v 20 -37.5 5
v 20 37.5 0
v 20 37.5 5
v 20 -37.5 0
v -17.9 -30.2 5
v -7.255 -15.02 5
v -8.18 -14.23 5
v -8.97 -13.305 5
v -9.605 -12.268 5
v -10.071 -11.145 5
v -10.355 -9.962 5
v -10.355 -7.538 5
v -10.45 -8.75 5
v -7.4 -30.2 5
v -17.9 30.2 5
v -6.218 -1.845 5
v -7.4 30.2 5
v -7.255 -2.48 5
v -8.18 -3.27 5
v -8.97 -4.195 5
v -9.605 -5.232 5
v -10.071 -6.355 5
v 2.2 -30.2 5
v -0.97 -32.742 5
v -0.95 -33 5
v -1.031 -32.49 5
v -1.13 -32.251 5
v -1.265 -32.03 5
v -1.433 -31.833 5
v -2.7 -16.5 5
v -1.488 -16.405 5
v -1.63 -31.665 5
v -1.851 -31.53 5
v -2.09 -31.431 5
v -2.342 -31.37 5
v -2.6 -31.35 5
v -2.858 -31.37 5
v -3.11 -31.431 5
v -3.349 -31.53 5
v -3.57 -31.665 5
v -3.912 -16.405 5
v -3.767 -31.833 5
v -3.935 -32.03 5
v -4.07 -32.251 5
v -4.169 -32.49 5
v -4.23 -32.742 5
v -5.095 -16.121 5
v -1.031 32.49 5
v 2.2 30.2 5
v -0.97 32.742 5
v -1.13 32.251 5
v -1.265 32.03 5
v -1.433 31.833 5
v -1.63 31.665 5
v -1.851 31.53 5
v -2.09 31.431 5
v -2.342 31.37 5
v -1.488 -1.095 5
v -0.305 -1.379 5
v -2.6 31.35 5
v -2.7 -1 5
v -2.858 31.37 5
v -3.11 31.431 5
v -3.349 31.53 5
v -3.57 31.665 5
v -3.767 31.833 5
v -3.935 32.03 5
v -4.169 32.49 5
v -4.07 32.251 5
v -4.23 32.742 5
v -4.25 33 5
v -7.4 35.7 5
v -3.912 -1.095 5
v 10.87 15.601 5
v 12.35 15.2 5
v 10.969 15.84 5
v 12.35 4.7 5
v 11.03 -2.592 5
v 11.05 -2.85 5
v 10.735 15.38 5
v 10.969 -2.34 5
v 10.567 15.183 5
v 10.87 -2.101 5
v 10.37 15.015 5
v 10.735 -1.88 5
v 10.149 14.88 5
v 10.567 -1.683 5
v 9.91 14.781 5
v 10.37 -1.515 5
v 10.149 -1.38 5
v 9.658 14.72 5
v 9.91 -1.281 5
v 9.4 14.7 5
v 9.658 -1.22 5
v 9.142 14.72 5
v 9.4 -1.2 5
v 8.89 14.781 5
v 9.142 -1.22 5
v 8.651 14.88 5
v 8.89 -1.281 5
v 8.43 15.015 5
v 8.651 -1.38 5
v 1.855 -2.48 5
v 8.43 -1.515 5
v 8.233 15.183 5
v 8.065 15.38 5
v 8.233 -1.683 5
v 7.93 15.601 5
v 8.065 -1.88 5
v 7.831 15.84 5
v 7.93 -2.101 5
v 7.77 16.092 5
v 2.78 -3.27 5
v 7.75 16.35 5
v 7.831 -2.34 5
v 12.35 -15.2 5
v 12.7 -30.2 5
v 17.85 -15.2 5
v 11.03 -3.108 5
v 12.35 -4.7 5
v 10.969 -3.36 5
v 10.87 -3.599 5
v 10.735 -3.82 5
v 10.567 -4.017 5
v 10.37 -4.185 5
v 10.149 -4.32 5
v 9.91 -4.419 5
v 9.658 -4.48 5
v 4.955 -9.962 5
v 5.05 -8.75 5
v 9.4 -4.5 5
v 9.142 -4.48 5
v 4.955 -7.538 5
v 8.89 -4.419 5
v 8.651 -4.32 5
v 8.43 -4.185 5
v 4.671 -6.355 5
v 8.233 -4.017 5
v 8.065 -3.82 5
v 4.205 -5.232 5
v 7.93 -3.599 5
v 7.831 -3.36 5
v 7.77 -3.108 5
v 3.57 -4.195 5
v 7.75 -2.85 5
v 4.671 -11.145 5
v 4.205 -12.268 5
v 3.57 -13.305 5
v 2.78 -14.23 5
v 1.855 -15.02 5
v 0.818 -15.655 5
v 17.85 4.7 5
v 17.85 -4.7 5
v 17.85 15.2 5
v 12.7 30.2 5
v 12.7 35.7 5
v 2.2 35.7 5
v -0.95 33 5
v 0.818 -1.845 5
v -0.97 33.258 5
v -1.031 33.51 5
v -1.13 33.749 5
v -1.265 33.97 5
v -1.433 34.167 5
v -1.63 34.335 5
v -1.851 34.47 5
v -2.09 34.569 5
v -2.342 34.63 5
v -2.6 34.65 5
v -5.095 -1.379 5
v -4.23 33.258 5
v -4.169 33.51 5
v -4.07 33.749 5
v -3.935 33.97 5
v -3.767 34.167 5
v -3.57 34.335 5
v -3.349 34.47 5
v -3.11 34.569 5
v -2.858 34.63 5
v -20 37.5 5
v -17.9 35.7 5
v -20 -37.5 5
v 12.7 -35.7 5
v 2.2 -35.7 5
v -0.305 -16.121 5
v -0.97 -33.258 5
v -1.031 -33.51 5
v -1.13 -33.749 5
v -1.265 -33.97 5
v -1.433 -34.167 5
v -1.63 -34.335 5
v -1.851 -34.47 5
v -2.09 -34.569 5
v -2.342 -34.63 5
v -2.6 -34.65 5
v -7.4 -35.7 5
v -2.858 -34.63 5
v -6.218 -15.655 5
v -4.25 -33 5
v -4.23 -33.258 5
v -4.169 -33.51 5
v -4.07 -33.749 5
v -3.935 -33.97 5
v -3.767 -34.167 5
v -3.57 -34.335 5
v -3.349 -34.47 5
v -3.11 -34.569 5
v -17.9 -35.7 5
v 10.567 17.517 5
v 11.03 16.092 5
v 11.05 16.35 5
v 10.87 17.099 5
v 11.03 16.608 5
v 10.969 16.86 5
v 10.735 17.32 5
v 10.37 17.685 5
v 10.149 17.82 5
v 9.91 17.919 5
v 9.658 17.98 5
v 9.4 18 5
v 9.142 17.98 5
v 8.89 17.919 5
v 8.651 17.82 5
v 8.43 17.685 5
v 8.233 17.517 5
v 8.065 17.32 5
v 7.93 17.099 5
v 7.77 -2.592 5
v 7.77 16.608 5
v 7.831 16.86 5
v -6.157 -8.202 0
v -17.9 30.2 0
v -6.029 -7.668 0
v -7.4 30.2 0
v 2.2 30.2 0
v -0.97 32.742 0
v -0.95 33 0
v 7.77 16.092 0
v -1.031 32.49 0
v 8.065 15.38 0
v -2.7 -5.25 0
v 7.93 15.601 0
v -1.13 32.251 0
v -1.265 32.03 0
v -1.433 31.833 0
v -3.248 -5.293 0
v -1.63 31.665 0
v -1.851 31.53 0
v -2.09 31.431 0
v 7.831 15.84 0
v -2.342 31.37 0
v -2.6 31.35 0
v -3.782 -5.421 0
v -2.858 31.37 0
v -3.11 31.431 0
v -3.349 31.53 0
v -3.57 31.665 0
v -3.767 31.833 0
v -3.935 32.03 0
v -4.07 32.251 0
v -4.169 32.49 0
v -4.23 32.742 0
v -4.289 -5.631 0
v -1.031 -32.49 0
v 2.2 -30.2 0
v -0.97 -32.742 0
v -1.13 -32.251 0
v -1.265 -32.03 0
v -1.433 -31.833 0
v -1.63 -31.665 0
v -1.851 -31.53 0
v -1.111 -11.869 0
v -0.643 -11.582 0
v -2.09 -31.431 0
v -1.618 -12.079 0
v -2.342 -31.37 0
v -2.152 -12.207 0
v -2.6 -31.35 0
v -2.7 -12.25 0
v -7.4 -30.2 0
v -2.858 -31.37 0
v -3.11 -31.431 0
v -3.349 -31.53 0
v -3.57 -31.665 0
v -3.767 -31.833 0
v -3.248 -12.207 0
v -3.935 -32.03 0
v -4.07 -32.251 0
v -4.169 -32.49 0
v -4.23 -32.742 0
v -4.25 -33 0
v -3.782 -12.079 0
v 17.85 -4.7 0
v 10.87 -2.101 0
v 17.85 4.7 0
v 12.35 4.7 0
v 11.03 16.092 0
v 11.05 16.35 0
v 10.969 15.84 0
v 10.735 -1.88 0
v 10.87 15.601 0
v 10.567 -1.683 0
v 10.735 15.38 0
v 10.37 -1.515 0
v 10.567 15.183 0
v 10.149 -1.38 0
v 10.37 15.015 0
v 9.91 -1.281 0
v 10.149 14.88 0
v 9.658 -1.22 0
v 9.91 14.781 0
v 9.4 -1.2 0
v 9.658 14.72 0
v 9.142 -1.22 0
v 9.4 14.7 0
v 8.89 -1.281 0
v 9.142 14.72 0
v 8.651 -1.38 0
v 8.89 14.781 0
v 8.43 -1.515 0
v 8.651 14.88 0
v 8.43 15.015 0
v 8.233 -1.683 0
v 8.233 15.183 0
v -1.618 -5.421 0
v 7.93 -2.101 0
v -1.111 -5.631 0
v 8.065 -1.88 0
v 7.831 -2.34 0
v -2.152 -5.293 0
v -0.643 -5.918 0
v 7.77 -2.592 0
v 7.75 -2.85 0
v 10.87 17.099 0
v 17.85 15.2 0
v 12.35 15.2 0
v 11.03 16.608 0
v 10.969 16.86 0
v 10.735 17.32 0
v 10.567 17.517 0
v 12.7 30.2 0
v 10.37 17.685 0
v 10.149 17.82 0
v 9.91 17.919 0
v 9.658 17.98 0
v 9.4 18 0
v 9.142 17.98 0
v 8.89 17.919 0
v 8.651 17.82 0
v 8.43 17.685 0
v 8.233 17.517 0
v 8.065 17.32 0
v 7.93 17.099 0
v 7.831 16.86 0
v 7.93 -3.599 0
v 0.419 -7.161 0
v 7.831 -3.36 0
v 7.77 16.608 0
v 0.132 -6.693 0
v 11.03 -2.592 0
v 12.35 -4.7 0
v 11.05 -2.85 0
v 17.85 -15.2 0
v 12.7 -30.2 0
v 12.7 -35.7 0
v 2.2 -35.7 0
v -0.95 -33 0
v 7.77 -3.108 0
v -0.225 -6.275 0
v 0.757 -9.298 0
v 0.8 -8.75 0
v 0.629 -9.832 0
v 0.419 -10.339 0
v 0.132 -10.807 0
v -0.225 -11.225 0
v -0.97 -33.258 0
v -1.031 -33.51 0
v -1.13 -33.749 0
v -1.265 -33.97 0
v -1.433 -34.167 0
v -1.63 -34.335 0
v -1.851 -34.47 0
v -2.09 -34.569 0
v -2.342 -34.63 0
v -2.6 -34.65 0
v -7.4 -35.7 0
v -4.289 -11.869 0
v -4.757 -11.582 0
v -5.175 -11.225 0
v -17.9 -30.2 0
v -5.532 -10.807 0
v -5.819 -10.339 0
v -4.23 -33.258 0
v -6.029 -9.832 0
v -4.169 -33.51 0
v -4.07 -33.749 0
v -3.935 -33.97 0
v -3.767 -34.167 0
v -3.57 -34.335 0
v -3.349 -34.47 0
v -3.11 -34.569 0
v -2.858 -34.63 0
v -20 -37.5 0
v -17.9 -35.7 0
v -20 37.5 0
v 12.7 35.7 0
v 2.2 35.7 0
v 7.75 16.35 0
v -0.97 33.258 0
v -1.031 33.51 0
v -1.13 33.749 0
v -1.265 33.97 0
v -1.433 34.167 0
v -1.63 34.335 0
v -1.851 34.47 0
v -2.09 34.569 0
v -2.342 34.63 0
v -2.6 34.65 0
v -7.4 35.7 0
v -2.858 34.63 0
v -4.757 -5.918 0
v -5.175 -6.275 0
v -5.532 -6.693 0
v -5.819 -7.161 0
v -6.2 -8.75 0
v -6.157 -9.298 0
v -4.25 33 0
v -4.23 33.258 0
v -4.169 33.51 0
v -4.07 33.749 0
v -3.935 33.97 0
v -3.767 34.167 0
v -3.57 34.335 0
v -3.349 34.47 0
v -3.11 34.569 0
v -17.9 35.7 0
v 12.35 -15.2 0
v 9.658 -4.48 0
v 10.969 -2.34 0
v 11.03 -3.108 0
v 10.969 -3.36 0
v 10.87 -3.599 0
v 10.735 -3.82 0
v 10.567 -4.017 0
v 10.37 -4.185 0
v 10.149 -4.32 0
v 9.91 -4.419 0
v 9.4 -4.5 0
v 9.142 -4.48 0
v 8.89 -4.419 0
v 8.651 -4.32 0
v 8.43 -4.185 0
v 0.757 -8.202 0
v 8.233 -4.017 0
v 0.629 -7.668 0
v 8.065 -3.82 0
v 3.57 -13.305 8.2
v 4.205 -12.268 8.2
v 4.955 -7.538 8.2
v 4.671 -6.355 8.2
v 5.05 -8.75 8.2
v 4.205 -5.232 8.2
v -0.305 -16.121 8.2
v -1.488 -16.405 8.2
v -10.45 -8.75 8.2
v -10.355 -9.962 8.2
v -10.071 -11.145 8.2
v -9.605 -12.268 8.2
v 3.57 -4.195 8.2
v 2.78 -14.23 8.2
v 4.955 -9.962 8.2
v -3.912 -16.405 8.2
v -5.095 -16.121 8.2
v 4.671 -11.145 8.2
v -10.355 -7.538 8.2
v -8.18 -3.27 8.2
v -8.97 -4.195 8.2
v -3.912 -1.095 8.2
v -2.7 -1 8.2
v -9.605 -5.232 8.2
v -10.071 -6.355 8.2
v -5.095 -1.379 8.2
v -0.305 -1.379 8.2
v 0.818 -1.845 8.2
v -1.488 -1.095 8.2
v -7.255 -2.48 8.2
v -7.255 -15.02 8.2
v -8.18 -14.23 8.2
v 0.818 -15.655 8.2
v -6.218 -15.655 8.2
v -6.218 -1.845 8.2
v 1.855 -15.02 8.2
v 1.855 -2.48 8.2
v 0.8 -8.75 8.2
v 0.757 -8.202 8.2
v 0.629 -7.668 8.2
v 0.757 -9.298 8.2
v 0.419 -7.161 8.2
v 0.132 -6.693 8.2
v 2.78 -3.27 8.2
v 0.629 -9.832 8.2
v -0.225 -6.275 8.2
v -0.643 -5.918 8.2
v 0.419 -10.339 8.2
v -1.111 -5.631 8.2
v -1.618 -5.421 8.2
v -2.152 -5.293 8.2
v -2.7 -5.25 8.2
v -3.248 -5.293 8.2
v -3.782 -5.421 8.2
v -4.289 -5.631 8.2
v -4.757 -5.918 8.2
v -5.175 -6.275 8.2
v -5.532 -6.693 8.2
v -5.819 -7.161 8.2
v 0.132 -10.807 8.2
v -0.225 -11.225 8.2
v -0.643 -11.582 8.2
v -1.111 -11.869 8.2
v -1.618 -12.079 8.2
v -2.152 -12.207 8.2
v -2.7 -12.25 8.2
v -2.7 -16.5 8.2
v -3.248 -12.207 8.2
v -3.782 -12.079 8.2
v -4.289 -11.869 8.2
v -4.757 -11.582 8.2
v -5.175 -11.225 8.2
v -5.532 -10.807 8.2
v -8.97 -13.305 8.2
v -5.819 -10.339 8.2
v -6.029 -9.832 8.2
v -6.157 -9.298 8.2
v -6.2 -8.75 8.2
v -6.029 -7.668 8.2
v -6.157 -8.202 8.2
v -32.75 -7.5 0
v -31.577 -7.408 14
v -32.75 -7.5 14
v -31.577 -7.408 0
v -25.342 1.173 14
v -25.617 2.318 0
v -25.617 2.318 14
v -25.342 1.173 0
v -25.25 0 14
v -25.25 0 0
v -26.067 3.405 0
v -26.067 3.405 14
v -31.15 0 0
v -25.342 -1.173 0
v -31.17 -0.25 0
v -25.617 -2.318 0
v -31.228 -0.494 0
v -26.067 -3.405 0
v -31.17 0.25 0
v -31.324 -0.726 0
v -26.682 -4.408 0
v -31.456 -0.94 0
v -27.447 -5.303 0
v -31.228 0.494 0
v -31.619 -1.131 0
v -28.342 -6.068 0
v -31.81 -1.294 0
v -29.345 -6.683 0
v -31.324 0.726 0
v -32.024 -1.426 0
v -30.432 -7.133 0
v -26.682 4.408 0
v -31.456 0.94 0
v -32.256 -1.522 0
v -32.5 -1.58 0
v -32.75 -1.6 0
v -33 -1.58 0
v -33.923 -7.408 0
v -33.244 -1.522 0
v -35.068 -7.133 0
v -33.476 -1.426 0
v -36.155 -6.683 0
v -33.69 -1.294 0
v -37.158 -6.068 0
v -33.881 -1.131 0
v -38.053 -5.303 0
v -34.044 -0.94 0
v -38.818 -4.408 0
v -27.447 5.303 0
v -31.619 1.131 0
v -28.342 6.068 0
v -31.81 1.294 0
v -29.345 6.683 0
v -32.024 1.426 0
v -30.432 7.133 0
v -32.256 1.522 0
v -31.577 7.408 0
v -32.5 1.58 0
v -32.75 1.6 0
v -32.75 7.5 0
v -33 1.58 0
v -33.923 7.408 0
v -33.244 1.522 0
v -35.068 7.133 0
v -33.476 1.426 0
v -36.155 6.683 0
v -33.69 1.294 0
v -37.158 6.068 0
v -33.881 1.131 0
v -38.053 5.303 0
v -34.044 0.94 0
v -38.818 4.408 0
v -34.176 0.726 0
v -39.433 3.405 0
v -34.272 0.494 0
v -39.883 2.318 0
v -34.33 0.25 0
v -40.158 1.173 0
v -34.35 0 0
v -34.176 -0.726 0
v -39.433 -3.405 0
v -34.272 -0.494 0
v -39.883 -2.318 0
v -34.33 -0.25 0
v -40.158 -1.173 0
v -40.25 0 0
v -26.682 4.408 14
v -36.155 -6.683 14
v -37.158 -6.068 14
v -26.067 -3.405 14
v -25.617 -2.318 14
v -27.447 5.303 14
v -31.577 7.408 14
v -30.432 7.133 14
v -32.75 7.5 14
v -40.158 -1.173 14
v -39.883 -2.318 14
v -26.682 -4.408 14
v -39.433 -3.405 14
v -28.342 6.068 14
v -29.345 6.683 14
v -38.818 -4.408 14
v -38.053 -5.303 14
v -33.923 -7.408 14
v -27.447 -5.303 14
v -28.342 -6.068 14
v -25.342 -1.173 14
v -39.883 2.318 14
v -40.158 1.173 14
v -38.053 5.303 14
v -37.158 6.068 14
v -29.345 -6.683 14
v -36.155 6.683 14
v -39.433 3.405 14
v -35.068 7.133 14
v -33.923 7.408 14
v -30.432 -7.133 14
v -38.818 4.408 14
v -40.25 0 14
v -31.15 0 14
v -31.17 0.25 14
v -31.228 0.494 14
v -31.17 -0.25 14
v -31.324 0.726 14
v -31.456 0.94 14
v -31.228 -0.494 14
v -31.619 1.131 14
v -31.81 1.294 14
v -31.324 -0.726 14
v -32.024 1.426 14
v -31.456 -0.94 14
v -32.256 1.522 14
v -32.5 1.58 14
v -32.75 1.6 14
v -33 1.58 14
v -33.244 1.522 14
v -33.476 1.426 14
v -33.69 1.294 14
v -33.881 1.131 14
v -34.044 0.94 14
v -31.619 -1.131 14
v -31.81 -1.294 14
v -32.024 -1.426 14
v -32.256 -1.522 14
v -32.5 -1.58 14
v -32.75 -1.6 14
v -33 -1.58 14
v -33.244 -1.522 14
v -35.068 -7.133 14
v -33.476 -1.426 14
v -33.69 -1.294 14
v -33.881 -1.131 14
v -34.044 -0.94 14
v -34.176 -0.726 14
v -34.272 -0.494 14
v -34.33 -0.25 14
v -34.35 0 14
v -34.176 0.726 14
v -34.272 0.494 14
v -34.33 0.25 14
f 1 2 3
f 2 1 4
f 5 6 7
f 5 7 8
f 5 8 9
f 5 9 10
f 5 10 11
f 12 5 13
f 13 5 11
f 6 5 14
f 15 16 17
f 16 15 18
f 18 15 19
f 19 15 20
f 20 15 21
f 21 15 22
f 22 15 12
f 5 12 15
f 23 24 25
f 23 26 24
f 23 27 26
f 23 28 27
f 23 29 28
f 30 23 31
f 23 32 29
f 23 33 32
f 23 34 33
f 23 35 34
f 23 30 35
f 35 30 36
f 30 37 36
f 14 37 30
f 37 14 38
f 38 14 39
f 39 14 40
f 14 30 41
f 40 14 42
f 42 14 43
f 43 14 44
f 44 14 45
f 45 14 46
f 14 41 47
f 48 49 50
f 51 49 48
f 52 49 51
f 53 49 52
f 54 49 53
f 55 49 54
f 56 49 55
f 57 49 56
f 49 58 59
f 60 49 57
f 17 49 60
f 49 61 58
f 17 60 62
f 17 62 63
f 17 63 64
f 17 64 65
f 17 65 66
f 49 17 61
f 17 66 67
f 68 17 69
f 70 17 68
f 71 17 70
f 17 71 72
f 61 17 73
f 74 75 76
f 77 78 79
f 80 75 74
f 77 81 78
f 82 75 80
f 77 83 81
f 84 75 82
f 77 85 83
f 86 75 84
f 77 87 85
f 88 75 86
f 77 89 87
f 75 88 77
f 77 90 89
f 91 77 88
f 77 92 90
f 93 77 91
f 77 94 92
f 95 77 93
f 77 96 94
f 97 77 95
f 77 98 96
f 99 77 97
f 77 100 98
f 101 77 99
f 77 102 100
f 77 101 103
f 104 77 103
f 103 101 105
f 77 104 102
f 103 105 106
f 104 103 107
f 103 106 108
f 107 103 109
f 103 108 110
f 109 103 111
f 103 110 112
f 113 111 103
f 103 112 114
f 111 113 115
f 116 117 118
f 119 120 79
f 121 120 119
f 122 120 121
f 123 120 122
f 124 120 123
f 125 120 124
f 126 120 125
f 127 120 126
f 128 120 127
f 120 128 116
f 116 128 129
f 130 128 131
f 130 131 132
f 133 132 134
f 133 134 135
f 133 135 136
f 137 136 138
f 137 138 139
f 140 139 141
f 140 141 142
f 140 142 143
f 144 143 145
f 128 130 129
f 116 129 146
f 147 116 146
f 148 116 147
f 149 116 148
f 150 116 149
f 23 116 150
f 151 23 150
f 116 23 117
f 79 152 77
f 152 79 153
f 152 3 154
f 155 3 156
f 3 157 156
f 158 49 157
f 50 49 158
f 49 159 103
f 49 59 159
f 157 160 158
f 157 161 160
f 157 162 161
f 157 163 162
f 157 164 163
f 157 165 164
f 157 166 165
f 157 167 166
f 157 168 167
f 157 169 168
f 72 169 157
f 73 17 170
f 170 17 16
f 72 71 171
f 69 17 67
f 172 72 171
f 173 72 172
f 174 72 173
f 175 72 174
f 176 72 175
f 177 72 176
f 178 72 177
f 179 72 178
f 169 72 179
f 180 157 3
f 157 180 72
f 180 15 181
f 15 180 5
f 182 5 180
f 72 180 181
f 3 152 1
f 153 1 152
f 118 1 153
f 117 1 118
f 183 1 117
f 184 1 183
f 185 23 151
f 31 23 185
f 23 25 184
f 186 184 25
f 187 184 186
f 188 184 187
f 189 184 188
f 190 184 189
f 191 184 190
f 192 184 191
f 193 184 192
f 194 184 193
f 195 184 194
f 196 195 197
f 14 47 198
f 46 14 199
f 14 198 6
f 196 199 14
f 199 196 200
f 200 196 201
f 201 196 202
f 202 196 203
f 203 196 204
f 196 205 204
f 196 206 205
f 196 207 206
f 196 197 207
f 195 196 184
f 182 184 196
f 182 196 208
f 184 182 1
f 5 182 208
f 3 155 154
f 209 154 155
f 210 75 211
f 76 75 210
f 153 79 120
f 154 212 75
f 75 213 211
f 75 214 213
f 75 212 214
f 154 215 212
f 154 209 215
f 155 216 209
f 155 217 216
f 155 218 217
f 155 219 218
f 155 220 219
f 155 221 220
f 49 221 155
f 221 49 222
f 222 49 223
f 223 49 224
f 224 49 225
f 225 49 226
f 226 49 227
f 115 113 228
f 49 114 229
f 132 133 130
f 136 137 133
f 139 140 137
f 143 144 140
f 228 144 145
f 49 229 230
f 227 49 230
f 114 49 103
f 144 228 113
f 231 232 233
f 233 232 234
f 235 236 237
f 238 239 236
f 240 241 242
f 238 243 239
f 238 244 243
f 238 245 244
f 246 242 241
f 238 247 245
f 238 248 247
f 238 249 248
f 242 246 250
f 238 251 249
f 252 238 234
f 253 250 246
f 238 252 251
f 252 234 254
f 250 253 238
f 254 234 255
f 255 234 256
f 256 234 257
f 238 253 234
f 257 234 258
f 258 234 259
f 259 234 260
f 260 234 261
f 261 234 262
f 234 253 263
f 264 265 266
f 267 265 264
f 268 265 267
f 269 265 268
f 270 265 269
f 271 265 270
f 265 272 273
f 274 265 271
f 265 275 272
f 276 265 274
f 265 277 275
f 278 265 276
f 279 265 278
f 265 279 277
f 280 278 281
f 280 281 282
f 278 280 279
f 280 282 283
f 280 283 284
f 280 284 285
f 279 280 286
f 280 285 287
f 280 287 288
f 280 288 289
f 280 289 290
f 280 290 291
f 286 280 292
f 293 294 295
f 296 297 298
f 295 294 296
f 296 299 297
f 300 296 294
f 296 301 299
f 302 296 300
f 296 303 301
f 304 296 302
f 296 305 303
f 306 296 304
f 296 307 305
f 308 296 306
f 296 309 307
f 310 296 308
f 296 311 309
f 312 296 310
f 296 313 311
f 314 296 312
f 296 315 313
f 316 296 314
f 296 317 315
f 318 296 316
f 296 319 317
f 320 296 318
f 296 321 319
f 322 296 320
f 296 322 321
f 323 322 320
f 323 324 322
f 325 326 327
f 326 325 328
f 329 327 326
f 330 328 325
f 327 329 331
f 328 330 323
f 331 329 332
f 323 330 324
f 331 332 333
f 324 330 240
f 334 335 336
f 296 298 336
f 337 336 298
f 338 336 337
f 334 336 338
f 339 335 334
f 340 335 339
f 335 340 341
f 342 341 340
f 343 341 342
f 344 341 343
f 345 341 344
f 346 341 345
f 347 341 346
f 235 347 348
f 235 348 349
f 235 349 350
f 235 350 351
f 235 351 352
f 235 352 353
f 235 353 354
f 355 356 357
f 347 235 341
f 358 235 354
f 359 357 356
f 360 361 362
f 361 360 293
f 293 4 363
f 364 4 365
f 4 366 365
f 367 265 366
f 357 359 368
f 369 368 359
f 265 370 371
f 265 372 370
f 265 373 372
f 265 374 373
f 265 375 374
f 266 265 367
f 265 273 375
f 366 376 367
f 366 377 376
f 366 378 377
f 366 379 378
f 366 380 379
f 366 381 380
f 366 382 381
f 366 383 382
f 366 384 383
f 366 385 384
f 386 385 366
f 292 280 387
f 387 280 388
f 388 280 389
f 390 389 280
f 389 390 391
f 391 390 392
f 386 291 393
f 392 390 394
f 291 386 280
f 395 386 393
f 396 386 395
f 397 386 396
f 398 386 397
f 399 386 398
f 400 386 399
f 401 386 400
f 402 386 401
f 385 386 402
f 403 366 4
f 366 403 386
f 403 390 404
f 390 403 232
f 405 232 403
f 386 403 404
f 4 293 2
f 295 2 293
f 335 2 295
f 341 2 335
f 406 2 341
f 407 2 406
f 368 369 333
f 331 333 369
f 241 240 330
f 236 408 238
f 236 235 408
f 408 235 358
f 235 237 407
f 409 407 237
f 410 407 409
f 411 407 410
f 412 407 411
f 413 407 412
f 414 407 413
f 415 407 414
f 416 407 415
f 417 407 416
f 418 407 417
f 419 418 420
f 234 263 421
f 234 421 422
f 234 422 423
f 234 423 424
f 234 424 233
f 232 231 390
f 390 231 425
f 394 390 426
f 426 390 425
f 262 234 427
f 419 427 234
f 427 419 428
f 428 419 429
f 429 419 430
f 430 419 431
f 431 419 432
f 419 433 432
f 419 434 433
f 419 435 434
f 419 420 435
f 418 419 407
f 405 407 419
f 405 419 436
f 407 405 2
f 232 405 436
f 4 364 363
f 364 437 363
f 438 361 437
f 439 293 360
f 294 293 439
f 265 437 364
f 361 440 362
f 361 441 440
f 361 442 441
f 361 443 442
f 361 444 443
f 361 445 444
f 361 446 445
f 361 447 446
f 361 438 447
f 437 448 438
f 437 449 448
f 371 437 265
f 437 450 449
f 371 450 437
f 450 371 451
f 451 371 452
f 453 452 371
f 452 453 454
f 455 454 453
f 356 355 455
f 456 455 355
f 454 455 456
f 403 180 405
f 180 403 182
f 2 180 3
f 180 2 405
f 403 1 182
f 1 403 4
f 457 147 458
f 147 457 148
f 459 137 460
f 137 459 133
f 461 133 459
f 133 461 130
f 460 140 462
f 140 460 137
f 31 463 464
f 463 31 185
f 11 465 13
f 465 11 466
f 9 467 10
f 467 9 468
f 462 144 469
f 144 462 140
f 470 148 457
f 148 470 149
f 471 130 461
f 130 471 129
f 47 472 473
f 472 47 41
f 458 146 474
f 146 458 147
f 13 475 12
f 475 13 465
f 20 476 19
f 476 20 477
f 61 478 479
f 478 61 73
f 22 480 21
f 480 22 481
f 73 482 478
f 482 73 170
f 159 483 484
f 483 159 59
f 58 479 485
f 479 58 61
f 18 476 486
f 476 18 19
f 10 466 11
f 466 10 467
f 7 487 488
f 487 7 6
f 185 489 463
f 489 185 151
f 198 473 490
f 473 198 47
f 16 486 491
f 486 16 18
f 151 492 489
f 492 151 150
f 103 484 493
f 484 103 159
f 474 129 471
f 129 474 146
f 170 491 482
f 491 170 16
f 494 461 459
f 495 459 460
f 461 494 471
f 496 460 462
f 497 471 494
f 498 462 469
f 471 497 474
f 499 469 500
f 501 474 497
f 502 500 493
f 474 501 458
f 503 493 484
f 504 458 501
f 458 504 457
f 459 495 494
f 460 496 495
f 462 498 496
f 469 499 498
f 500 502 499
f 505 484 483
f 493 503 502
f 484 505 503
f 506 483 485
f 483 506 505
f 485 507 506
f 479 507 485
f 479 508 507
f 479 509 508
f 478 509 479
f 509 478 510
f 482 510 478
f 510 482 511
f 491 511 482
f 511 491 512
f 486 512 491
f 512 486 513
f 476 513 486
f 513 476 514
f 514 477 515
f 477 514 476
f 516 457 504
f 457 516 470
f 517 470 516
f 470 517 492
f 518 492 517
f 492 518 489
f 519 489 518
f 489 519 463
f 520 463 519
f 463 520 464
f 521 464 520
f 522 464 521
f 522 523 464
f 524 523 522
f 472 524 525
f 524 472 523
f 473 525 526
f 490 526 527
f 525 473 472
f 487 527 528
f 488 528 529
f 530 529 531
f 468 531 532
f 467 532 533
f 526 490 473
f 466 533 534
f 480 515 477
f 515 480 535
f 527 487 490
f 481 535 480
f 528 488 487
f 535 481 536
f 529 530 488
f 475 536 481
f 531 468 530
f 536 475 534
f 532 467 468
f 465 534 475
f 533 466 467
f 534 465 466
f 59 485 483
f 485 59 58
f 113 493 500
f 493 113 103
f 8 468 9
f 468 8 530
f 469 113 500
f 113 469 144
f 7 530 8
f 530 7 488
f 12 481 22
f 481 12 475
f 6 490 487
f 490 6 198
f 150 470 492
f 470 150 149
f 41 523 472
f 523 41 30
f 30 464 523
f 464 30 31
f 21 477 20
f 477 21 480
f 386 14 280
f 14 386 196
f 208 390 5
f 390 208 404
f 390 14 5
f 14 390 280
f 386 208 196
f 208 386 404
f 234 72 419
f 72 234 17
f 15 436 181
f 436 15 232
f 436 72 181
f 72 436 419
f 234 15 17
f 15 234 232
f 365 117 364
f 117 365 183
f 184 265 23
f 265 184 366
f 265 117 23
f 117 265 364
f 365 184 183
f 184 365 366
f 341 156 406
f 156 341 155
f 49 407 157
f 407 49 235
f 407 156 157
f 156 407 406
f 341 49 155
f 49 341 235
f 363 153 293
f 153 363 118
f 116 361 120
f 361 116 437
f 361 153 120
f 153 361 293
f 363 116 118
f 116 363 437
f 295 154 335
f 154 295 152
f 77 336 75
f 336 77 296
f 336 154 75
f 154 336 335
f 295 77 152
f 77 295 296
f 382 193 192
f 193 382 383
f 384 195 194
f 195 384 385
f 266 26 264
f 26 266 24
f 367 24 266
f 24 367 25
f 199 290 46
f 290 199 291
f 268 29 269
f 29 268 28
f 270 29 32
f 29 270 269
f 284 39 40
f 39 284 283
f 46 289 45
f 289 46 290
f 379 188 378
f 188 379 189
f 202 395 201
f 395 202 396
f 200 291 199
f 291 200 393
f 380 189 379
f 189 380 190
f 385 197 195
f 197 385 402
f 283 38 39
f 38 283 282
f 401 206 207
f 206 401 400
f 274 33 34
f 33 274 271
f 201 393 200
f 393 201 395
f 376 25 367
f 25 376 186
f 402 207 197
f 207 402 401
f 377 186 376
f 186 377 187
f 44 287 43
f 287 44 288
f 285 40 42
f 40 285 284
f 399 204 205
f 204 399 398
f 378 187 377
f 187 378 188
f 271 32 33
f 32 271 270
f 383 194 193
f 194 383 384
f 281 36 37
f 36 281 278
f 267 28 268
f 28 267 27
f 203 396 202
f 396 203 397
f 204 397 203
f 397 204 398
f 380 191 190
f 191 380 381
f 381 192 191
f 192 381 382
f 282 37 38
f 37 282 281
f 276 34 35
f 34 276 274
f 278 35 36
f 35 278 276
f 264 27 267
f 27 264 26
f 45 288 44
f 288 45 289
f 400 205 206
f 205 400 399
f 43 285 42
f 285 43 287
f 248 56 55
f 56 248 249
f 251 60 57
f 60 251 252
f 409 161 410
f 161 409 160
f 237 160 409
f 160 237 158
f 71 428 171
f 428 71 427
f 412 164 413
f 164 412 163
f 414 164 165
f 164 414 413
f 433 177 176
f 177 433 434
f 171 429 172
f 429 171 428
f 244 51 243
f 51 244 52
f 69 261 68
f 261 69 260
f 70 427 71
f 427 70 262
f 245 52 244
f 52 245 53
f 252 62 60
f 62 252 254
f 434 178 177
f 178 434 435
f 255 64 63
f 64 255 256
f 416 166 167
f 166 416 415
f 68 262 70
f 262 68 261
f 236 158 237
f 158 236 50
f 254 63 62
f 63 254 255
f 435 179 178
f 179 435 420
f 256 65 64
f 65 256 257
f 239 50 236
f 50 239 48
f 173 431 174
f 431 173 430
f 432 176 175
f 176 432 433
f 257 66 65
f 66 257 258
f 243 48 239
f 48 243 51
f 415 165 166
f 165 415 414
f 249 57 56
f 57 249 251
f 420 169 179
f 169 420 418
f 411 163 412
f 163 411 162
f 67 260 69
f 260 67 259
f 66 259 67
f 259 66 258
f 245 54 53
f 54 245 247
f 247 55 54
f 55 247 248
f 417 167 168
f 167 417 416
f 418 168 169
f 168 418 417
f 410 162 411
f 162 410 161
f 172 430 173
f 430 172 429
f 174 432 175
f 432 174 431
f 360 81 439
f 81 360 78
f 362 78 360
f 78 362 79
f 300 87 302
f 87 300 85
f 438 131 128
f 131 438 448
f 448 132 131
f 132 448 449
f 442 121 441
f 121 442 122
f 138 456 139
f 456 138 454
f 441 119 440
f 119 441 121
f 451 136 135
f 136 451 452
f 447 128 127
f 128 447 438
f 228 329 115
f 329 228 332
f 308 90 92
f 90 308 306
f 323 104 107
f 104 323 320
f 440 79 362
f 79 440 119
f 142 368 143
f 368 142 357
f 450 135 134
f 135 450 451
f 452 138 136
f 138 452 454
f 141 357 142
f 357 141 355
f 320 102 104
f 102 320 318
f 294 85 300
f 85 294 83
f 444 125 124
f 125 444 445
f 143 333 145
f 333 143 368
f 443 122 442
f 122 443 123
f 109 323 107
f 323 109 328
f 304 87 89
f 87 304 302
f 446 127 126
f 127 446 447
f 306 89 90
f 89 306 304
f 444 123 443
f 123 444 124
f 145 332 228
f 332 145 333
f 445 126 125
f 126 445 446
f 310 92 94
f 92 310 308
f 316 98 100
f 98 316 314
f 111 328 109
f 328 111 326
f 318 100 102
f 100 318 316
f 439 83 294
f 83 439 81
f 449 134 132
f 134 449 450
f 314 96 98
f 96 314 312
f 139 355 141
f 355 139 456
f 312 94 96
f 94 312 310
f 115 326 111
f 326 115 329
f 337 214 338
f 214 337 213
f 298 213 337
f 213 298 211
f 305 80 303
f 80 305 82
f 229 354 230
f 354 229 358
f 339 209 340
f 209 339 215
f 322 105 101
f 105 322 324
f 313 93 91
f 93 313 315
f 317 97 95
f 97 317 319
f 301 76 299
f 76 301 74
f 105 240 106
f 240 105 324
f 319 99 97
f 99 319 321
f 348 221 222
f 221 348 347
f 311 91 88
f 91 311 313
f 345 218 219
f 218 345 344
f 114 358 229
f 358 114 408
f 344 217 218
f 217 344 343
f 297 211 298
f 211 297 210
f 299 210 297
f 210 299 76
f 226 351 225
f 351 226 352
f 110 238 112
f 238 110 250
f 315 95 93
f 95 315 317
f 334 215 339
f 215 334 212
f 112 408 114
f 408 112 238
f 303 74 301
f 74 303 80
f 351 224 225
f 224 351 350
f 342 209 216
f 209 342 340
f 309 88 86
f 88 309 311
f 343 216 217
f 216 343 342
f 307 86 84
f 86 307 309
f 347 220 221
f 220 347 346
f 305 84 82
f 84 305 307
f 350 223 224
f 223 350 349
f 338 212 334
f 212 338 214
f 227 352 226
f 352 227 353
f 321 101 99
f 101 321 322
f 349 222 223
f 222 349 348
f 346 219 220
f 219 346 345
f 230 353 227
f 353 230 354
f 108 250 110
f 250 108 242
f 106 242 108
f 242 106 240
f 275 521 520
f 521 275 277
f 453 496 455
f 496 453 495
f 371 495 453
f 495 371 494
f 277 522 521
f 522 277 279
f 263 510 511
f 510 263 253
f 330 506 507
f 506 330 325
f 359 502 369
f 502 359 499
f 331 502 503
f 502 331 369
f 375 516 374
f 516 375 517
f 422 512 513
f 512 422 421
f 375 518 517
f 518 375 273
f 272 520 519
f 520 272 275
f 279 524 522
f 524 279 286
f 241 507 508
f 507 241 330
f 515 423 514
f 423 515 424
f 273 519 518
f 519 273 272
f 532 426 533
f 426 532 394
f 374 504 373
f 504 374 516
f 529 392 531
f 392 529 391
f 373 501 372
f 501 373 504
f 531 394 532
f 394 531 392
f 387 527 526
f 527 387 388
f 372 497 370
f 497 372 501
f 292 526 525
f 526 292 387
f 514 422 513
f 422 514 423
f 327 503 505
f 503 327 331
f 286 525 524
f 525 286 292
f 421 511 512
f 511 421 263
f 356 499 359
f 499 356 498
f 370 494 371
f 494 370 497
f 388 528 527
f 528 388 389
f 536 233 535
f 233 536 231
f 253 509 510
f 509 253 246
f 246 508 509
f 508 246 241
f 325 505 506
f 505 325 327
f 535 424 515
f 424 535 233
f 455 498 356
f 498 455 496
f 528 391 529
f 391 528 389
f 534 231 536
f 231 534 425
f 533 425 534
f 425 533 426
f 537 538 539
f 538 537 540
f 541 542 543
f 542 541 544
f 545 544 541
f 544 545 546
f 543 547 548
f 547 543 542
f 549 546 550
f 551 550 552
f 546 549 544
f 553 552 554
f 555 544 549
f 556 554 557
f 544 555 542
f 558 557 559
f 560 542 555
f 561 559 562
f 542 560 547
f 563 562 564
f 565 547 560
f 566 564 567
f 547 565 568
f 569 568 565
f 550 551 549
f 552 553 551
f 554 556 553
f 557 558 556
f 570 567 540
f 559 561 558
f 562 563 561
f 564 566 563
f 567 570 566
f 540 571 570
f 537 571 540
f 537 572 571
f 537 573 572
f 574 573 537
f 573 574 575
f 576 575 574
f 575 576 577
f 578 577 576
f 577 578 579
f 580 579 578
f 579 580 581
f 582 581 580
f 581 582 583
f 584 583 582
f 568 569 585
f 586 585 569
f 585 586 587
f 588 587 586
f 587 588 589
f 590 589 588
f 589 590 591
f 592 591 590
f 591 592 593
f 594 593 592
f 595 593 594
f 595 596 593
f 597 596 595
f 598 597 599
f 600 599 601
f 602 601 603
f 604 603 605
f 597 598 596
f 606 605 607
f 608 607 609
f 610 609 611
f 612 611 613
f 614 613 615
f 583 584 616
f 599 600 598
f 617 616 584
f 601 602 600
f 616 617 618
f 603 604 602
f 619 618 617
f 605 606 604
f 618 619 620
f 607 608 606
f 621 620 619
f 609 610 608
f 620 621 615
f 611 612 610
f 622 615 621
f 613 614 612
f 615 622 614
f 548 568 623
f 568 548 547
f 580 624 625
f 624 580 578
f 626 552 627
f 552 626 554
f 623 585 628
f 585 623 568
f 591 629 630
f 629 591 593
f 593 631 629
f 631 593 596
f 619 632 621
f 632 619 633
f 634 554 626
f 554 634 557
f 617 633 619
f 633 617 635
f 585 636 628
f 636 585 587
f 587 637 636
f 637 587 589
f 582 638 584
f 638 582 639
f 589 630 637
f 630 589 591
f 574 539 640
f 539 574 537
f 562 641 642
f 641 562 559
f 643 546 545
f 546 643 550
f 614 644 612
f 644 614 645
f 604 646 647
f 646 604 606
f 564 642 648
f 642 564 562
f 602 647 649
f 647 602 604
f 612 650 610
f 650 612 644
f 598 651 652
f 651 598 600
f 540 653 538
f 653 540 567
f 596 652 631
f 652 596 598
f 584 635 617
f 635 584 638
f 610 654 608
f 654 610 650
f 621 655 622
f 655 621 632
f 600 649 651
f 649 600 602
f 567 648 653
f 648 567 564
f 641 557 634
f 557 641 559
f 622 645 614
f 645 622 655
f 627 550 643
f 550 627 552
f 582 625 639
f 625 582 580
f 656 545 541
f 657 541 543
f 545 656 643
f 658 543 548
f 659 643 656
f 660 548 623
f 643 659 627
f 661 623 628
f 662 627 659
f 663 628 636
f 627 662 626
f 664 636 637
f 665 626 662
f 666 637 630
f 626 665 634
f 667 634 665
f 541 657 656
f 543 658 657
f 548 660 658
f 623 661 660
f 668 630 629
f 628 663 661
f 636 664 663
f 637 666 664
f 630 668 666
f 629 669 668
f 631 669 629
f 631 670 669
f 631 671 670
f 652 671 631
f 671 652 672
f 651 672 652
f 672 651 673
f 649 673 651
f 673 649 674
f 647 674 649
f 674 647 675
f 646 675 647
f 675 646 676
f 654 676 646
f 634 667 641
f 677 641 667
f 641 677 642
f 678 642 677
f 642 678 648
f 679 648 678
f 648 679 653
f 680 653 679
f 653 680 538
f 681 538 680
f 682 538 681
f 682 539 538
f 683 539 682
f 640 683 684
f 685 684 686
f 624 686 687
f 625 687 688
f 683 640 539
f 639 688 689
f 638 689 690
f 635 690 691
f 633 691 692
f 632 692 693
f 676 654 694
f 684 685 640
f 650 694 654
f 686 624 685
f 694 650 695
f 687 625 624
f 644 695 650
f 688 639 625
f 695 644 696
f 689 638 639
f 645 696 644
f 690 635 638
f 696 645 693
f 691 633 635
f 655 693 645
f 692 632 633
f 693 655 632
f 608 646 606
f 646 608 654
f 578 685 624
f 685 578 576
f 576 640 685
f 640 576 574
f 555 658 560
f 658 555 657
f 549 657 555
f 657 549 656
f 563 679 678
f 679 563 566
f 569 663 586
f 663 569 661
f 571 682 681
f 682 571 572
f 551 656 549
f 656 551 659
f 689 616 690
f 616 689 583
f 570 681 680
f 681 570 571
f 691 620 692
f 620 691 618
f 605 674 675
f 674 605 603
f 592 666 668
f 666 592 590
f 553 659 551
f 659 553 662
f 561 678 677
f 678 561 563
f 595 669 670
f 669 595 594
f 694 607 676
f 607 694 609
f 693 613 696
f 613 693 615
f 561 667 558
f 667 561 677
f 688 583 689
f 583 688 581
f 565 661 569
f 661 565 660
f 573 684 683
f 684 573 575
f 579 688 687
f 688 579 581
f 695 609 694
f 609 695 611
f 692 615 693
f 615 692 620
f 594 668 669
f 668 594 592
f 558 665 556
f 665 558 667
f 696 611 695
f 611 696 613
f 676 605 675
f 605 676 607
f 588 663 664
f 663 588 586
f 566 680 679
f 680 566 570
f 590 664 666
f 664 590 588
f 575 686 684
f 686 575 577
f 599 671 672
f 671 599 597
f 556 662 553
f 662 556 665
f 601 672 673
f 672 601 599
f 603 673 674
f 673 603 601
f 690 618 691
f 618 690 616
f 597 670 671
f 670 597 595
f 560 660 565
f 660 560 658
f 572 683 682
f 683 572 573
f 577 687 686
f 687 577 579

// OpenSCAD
// License:  Creative Commons Attribtion-NonCommercial-ShareAlike
// http://creativecommons.org/licenses/by-nc-sa/3.0/legalcode
//
// Author: Jetty, 9th August, 2012
//
//
// X-Axis Idler Support Bracket for Thing-O-Matic

// Small changes by Aaron Ciuffo - aaron.ciuffo@gmail.com
// removed endstopSpacers to accomodate strain relief thing:
// http://www.thingiverse.com/thing:15489

manifoldCorrection = 0.1;
plateDimensions = [40, 75, 5];
squareHoleDimensionsSide = [10.5, 5.5, plateDimensions[2] + manifoldCorrection * 2];
squareHoleDimensionsEnd = [squareHoleDimensionsSide[1], squareHoleDimensionsSide[0], squareHoleDimensionsSide[2]];
hole1LocationX = 2.1;
hole2LocationX = 22.2;
holeSideLocationY = 1.8;
hole3LocationX = 32.35;
holeEndLocationY = 22.3;
boltHoleM3Radius = 3.3 / 2;
boltHoleM3SideLocationX = 15.75 + boltHoleM3Radius;
boltHoleM3SideLocationY = 2.85 + boltHoleM3Radius;
boltHoleM3EndLocationX = 27.75 + boltHoleM3Radius;
boltHoleM3EndLocationY1 = 33 + boltHoleM3Radius;
boltHoleM3EndLocationY2 = 52.2 + boltHoleM3Radius;
endstopSpacerRadius = 8 / 2;
endstopSpacerHeight = 0;
idlerRetainerOuterRadius = 15.5 / 2;
idlerRetainerInnerRadius = 7 / 2;
idlerRetainerHeight = 3.2;
idlerRetainerLocationX = 17.3;
idlerRetainerLocationY = 28.75;
boltSupportInnerRadius = 3.2 / 2;
boltSupportHeight = 14;
boltSupportOuterRadius = 15 / 2;

$fn = 40;

idlerPlate();
translate( [-(plateDimensions[0] / 2 + idlerRetainerOuterRadius + 5), 0, 0] )
	boltSupport();


module boltSupport()
{
	difference()
	{
		cylinder( r = boltSupportOuterRadius, h = boltSupportHeight );
		translate( [0, 0, -manifoldCorrection] )
			cylinder( r = boltSupportInnerRadius, h = boltSupportHeight + manifoldCorrection * 2 );
	}
}



module idlerPlate()
{
	translate( [-plateDimensions[0] / 2, -plateDimensions[1] / 2, 0] )
	{
		difference()
		{
			//The main plate
			union()
			{
				cube( plateDimensions );

				//Add the end stop spacers
				translate( [boltHoleM3EndLocationX, boltHoleM3EndLocationY1, 0] )
					cylinder( r = endstopSpacerRadius, h = endstopSpacerHeight + plateDimensions[2] );
				translate( [boltHoleM3EndLocationX, boltHoleM3EndLocationY2, 0] )
					cylinder( r = endstopSpacerRadius, h = endstopSpacerHeight + plateDimensions[2] );	
	
				//Add the idler bolt retainer
				translate( [idlerRetainerLocationX, idlerRetainerLocationY, 0] )
					cylinder( r = idlerRetainerOuterRadius, h = idlerRetainerHeight + plateDimensions[2] );
			}

			//Remove holes
			translate( [0, 0, -manifoldCorrection] )
			{
				//Side Square Holes (1 and 2)
				for ( x = [hole1LocationX, hole2LocationX] )
				{
					translate( [x, holeSideLocationY, 0] )
						cube( squareHoleDimensionsSide );
					translate( [x, plateDimensions[1] - (holeSideLocationY + squareHoleDimensionsSide[1]), 0] 	)
						cube( squareHoleDimensionsSide );
				}

				//End Square Holes (3)
				translate( [hole3LocationX, holeEndLocationY, 0] )
					cube( squareHoleDimensionsEnd );
				translate( [hole3LocationX, plateDimensions[1] - (holeEndLocationY + squareHoleDimensionsEnd[1]), 0] )
					cube( squareHoleDimensionsEnd );

				//Side Bolt Holes
				translate( [boltHoleM3SideLocationX, boltHoleM3SideLocationY, 0] )
					cylinder( r = boltHoleM3Radius, h = plateDimensions[2] + manifoldCorrection * 2 );
				translate( [boltHoleM3SideLocationX, plateDimensions[1] - boltHoleM3SideLocationY, 0] )
					cylinder( r = boltHoleM3Radius, h = plateDimensions[2] + manifoldCorrection * 2 );	

				//Endstop Bolt Holes
				translate( [boltHoleM3EndLocationX, boltHoleM3EndLocationY1, 0] )
					cylinder( r = boltHoleM3Radius, h = plateDimensions[2] + endstopSpacerHeight + manifoldCorrection * 2 );
				translate( [boltHoleM3EndLocationX, boltHoleM3EndLocationY2, 0] )
					cylinder( r = boltHoleM3Radius, h = plateDimensions[2] + endstopSpacerHeight + manifoldCorrection * 2 );

				//Idler hole
				translate( [idlerRetainerLocationX, idlerRetainerLocationY, 0] )
					cylinder( r = idlerRetainerInnerRadius, h = idlerRetainerHeight + plateDimensions[2] + manifoldCorrection * 2 );

			}
		}
	}
}
